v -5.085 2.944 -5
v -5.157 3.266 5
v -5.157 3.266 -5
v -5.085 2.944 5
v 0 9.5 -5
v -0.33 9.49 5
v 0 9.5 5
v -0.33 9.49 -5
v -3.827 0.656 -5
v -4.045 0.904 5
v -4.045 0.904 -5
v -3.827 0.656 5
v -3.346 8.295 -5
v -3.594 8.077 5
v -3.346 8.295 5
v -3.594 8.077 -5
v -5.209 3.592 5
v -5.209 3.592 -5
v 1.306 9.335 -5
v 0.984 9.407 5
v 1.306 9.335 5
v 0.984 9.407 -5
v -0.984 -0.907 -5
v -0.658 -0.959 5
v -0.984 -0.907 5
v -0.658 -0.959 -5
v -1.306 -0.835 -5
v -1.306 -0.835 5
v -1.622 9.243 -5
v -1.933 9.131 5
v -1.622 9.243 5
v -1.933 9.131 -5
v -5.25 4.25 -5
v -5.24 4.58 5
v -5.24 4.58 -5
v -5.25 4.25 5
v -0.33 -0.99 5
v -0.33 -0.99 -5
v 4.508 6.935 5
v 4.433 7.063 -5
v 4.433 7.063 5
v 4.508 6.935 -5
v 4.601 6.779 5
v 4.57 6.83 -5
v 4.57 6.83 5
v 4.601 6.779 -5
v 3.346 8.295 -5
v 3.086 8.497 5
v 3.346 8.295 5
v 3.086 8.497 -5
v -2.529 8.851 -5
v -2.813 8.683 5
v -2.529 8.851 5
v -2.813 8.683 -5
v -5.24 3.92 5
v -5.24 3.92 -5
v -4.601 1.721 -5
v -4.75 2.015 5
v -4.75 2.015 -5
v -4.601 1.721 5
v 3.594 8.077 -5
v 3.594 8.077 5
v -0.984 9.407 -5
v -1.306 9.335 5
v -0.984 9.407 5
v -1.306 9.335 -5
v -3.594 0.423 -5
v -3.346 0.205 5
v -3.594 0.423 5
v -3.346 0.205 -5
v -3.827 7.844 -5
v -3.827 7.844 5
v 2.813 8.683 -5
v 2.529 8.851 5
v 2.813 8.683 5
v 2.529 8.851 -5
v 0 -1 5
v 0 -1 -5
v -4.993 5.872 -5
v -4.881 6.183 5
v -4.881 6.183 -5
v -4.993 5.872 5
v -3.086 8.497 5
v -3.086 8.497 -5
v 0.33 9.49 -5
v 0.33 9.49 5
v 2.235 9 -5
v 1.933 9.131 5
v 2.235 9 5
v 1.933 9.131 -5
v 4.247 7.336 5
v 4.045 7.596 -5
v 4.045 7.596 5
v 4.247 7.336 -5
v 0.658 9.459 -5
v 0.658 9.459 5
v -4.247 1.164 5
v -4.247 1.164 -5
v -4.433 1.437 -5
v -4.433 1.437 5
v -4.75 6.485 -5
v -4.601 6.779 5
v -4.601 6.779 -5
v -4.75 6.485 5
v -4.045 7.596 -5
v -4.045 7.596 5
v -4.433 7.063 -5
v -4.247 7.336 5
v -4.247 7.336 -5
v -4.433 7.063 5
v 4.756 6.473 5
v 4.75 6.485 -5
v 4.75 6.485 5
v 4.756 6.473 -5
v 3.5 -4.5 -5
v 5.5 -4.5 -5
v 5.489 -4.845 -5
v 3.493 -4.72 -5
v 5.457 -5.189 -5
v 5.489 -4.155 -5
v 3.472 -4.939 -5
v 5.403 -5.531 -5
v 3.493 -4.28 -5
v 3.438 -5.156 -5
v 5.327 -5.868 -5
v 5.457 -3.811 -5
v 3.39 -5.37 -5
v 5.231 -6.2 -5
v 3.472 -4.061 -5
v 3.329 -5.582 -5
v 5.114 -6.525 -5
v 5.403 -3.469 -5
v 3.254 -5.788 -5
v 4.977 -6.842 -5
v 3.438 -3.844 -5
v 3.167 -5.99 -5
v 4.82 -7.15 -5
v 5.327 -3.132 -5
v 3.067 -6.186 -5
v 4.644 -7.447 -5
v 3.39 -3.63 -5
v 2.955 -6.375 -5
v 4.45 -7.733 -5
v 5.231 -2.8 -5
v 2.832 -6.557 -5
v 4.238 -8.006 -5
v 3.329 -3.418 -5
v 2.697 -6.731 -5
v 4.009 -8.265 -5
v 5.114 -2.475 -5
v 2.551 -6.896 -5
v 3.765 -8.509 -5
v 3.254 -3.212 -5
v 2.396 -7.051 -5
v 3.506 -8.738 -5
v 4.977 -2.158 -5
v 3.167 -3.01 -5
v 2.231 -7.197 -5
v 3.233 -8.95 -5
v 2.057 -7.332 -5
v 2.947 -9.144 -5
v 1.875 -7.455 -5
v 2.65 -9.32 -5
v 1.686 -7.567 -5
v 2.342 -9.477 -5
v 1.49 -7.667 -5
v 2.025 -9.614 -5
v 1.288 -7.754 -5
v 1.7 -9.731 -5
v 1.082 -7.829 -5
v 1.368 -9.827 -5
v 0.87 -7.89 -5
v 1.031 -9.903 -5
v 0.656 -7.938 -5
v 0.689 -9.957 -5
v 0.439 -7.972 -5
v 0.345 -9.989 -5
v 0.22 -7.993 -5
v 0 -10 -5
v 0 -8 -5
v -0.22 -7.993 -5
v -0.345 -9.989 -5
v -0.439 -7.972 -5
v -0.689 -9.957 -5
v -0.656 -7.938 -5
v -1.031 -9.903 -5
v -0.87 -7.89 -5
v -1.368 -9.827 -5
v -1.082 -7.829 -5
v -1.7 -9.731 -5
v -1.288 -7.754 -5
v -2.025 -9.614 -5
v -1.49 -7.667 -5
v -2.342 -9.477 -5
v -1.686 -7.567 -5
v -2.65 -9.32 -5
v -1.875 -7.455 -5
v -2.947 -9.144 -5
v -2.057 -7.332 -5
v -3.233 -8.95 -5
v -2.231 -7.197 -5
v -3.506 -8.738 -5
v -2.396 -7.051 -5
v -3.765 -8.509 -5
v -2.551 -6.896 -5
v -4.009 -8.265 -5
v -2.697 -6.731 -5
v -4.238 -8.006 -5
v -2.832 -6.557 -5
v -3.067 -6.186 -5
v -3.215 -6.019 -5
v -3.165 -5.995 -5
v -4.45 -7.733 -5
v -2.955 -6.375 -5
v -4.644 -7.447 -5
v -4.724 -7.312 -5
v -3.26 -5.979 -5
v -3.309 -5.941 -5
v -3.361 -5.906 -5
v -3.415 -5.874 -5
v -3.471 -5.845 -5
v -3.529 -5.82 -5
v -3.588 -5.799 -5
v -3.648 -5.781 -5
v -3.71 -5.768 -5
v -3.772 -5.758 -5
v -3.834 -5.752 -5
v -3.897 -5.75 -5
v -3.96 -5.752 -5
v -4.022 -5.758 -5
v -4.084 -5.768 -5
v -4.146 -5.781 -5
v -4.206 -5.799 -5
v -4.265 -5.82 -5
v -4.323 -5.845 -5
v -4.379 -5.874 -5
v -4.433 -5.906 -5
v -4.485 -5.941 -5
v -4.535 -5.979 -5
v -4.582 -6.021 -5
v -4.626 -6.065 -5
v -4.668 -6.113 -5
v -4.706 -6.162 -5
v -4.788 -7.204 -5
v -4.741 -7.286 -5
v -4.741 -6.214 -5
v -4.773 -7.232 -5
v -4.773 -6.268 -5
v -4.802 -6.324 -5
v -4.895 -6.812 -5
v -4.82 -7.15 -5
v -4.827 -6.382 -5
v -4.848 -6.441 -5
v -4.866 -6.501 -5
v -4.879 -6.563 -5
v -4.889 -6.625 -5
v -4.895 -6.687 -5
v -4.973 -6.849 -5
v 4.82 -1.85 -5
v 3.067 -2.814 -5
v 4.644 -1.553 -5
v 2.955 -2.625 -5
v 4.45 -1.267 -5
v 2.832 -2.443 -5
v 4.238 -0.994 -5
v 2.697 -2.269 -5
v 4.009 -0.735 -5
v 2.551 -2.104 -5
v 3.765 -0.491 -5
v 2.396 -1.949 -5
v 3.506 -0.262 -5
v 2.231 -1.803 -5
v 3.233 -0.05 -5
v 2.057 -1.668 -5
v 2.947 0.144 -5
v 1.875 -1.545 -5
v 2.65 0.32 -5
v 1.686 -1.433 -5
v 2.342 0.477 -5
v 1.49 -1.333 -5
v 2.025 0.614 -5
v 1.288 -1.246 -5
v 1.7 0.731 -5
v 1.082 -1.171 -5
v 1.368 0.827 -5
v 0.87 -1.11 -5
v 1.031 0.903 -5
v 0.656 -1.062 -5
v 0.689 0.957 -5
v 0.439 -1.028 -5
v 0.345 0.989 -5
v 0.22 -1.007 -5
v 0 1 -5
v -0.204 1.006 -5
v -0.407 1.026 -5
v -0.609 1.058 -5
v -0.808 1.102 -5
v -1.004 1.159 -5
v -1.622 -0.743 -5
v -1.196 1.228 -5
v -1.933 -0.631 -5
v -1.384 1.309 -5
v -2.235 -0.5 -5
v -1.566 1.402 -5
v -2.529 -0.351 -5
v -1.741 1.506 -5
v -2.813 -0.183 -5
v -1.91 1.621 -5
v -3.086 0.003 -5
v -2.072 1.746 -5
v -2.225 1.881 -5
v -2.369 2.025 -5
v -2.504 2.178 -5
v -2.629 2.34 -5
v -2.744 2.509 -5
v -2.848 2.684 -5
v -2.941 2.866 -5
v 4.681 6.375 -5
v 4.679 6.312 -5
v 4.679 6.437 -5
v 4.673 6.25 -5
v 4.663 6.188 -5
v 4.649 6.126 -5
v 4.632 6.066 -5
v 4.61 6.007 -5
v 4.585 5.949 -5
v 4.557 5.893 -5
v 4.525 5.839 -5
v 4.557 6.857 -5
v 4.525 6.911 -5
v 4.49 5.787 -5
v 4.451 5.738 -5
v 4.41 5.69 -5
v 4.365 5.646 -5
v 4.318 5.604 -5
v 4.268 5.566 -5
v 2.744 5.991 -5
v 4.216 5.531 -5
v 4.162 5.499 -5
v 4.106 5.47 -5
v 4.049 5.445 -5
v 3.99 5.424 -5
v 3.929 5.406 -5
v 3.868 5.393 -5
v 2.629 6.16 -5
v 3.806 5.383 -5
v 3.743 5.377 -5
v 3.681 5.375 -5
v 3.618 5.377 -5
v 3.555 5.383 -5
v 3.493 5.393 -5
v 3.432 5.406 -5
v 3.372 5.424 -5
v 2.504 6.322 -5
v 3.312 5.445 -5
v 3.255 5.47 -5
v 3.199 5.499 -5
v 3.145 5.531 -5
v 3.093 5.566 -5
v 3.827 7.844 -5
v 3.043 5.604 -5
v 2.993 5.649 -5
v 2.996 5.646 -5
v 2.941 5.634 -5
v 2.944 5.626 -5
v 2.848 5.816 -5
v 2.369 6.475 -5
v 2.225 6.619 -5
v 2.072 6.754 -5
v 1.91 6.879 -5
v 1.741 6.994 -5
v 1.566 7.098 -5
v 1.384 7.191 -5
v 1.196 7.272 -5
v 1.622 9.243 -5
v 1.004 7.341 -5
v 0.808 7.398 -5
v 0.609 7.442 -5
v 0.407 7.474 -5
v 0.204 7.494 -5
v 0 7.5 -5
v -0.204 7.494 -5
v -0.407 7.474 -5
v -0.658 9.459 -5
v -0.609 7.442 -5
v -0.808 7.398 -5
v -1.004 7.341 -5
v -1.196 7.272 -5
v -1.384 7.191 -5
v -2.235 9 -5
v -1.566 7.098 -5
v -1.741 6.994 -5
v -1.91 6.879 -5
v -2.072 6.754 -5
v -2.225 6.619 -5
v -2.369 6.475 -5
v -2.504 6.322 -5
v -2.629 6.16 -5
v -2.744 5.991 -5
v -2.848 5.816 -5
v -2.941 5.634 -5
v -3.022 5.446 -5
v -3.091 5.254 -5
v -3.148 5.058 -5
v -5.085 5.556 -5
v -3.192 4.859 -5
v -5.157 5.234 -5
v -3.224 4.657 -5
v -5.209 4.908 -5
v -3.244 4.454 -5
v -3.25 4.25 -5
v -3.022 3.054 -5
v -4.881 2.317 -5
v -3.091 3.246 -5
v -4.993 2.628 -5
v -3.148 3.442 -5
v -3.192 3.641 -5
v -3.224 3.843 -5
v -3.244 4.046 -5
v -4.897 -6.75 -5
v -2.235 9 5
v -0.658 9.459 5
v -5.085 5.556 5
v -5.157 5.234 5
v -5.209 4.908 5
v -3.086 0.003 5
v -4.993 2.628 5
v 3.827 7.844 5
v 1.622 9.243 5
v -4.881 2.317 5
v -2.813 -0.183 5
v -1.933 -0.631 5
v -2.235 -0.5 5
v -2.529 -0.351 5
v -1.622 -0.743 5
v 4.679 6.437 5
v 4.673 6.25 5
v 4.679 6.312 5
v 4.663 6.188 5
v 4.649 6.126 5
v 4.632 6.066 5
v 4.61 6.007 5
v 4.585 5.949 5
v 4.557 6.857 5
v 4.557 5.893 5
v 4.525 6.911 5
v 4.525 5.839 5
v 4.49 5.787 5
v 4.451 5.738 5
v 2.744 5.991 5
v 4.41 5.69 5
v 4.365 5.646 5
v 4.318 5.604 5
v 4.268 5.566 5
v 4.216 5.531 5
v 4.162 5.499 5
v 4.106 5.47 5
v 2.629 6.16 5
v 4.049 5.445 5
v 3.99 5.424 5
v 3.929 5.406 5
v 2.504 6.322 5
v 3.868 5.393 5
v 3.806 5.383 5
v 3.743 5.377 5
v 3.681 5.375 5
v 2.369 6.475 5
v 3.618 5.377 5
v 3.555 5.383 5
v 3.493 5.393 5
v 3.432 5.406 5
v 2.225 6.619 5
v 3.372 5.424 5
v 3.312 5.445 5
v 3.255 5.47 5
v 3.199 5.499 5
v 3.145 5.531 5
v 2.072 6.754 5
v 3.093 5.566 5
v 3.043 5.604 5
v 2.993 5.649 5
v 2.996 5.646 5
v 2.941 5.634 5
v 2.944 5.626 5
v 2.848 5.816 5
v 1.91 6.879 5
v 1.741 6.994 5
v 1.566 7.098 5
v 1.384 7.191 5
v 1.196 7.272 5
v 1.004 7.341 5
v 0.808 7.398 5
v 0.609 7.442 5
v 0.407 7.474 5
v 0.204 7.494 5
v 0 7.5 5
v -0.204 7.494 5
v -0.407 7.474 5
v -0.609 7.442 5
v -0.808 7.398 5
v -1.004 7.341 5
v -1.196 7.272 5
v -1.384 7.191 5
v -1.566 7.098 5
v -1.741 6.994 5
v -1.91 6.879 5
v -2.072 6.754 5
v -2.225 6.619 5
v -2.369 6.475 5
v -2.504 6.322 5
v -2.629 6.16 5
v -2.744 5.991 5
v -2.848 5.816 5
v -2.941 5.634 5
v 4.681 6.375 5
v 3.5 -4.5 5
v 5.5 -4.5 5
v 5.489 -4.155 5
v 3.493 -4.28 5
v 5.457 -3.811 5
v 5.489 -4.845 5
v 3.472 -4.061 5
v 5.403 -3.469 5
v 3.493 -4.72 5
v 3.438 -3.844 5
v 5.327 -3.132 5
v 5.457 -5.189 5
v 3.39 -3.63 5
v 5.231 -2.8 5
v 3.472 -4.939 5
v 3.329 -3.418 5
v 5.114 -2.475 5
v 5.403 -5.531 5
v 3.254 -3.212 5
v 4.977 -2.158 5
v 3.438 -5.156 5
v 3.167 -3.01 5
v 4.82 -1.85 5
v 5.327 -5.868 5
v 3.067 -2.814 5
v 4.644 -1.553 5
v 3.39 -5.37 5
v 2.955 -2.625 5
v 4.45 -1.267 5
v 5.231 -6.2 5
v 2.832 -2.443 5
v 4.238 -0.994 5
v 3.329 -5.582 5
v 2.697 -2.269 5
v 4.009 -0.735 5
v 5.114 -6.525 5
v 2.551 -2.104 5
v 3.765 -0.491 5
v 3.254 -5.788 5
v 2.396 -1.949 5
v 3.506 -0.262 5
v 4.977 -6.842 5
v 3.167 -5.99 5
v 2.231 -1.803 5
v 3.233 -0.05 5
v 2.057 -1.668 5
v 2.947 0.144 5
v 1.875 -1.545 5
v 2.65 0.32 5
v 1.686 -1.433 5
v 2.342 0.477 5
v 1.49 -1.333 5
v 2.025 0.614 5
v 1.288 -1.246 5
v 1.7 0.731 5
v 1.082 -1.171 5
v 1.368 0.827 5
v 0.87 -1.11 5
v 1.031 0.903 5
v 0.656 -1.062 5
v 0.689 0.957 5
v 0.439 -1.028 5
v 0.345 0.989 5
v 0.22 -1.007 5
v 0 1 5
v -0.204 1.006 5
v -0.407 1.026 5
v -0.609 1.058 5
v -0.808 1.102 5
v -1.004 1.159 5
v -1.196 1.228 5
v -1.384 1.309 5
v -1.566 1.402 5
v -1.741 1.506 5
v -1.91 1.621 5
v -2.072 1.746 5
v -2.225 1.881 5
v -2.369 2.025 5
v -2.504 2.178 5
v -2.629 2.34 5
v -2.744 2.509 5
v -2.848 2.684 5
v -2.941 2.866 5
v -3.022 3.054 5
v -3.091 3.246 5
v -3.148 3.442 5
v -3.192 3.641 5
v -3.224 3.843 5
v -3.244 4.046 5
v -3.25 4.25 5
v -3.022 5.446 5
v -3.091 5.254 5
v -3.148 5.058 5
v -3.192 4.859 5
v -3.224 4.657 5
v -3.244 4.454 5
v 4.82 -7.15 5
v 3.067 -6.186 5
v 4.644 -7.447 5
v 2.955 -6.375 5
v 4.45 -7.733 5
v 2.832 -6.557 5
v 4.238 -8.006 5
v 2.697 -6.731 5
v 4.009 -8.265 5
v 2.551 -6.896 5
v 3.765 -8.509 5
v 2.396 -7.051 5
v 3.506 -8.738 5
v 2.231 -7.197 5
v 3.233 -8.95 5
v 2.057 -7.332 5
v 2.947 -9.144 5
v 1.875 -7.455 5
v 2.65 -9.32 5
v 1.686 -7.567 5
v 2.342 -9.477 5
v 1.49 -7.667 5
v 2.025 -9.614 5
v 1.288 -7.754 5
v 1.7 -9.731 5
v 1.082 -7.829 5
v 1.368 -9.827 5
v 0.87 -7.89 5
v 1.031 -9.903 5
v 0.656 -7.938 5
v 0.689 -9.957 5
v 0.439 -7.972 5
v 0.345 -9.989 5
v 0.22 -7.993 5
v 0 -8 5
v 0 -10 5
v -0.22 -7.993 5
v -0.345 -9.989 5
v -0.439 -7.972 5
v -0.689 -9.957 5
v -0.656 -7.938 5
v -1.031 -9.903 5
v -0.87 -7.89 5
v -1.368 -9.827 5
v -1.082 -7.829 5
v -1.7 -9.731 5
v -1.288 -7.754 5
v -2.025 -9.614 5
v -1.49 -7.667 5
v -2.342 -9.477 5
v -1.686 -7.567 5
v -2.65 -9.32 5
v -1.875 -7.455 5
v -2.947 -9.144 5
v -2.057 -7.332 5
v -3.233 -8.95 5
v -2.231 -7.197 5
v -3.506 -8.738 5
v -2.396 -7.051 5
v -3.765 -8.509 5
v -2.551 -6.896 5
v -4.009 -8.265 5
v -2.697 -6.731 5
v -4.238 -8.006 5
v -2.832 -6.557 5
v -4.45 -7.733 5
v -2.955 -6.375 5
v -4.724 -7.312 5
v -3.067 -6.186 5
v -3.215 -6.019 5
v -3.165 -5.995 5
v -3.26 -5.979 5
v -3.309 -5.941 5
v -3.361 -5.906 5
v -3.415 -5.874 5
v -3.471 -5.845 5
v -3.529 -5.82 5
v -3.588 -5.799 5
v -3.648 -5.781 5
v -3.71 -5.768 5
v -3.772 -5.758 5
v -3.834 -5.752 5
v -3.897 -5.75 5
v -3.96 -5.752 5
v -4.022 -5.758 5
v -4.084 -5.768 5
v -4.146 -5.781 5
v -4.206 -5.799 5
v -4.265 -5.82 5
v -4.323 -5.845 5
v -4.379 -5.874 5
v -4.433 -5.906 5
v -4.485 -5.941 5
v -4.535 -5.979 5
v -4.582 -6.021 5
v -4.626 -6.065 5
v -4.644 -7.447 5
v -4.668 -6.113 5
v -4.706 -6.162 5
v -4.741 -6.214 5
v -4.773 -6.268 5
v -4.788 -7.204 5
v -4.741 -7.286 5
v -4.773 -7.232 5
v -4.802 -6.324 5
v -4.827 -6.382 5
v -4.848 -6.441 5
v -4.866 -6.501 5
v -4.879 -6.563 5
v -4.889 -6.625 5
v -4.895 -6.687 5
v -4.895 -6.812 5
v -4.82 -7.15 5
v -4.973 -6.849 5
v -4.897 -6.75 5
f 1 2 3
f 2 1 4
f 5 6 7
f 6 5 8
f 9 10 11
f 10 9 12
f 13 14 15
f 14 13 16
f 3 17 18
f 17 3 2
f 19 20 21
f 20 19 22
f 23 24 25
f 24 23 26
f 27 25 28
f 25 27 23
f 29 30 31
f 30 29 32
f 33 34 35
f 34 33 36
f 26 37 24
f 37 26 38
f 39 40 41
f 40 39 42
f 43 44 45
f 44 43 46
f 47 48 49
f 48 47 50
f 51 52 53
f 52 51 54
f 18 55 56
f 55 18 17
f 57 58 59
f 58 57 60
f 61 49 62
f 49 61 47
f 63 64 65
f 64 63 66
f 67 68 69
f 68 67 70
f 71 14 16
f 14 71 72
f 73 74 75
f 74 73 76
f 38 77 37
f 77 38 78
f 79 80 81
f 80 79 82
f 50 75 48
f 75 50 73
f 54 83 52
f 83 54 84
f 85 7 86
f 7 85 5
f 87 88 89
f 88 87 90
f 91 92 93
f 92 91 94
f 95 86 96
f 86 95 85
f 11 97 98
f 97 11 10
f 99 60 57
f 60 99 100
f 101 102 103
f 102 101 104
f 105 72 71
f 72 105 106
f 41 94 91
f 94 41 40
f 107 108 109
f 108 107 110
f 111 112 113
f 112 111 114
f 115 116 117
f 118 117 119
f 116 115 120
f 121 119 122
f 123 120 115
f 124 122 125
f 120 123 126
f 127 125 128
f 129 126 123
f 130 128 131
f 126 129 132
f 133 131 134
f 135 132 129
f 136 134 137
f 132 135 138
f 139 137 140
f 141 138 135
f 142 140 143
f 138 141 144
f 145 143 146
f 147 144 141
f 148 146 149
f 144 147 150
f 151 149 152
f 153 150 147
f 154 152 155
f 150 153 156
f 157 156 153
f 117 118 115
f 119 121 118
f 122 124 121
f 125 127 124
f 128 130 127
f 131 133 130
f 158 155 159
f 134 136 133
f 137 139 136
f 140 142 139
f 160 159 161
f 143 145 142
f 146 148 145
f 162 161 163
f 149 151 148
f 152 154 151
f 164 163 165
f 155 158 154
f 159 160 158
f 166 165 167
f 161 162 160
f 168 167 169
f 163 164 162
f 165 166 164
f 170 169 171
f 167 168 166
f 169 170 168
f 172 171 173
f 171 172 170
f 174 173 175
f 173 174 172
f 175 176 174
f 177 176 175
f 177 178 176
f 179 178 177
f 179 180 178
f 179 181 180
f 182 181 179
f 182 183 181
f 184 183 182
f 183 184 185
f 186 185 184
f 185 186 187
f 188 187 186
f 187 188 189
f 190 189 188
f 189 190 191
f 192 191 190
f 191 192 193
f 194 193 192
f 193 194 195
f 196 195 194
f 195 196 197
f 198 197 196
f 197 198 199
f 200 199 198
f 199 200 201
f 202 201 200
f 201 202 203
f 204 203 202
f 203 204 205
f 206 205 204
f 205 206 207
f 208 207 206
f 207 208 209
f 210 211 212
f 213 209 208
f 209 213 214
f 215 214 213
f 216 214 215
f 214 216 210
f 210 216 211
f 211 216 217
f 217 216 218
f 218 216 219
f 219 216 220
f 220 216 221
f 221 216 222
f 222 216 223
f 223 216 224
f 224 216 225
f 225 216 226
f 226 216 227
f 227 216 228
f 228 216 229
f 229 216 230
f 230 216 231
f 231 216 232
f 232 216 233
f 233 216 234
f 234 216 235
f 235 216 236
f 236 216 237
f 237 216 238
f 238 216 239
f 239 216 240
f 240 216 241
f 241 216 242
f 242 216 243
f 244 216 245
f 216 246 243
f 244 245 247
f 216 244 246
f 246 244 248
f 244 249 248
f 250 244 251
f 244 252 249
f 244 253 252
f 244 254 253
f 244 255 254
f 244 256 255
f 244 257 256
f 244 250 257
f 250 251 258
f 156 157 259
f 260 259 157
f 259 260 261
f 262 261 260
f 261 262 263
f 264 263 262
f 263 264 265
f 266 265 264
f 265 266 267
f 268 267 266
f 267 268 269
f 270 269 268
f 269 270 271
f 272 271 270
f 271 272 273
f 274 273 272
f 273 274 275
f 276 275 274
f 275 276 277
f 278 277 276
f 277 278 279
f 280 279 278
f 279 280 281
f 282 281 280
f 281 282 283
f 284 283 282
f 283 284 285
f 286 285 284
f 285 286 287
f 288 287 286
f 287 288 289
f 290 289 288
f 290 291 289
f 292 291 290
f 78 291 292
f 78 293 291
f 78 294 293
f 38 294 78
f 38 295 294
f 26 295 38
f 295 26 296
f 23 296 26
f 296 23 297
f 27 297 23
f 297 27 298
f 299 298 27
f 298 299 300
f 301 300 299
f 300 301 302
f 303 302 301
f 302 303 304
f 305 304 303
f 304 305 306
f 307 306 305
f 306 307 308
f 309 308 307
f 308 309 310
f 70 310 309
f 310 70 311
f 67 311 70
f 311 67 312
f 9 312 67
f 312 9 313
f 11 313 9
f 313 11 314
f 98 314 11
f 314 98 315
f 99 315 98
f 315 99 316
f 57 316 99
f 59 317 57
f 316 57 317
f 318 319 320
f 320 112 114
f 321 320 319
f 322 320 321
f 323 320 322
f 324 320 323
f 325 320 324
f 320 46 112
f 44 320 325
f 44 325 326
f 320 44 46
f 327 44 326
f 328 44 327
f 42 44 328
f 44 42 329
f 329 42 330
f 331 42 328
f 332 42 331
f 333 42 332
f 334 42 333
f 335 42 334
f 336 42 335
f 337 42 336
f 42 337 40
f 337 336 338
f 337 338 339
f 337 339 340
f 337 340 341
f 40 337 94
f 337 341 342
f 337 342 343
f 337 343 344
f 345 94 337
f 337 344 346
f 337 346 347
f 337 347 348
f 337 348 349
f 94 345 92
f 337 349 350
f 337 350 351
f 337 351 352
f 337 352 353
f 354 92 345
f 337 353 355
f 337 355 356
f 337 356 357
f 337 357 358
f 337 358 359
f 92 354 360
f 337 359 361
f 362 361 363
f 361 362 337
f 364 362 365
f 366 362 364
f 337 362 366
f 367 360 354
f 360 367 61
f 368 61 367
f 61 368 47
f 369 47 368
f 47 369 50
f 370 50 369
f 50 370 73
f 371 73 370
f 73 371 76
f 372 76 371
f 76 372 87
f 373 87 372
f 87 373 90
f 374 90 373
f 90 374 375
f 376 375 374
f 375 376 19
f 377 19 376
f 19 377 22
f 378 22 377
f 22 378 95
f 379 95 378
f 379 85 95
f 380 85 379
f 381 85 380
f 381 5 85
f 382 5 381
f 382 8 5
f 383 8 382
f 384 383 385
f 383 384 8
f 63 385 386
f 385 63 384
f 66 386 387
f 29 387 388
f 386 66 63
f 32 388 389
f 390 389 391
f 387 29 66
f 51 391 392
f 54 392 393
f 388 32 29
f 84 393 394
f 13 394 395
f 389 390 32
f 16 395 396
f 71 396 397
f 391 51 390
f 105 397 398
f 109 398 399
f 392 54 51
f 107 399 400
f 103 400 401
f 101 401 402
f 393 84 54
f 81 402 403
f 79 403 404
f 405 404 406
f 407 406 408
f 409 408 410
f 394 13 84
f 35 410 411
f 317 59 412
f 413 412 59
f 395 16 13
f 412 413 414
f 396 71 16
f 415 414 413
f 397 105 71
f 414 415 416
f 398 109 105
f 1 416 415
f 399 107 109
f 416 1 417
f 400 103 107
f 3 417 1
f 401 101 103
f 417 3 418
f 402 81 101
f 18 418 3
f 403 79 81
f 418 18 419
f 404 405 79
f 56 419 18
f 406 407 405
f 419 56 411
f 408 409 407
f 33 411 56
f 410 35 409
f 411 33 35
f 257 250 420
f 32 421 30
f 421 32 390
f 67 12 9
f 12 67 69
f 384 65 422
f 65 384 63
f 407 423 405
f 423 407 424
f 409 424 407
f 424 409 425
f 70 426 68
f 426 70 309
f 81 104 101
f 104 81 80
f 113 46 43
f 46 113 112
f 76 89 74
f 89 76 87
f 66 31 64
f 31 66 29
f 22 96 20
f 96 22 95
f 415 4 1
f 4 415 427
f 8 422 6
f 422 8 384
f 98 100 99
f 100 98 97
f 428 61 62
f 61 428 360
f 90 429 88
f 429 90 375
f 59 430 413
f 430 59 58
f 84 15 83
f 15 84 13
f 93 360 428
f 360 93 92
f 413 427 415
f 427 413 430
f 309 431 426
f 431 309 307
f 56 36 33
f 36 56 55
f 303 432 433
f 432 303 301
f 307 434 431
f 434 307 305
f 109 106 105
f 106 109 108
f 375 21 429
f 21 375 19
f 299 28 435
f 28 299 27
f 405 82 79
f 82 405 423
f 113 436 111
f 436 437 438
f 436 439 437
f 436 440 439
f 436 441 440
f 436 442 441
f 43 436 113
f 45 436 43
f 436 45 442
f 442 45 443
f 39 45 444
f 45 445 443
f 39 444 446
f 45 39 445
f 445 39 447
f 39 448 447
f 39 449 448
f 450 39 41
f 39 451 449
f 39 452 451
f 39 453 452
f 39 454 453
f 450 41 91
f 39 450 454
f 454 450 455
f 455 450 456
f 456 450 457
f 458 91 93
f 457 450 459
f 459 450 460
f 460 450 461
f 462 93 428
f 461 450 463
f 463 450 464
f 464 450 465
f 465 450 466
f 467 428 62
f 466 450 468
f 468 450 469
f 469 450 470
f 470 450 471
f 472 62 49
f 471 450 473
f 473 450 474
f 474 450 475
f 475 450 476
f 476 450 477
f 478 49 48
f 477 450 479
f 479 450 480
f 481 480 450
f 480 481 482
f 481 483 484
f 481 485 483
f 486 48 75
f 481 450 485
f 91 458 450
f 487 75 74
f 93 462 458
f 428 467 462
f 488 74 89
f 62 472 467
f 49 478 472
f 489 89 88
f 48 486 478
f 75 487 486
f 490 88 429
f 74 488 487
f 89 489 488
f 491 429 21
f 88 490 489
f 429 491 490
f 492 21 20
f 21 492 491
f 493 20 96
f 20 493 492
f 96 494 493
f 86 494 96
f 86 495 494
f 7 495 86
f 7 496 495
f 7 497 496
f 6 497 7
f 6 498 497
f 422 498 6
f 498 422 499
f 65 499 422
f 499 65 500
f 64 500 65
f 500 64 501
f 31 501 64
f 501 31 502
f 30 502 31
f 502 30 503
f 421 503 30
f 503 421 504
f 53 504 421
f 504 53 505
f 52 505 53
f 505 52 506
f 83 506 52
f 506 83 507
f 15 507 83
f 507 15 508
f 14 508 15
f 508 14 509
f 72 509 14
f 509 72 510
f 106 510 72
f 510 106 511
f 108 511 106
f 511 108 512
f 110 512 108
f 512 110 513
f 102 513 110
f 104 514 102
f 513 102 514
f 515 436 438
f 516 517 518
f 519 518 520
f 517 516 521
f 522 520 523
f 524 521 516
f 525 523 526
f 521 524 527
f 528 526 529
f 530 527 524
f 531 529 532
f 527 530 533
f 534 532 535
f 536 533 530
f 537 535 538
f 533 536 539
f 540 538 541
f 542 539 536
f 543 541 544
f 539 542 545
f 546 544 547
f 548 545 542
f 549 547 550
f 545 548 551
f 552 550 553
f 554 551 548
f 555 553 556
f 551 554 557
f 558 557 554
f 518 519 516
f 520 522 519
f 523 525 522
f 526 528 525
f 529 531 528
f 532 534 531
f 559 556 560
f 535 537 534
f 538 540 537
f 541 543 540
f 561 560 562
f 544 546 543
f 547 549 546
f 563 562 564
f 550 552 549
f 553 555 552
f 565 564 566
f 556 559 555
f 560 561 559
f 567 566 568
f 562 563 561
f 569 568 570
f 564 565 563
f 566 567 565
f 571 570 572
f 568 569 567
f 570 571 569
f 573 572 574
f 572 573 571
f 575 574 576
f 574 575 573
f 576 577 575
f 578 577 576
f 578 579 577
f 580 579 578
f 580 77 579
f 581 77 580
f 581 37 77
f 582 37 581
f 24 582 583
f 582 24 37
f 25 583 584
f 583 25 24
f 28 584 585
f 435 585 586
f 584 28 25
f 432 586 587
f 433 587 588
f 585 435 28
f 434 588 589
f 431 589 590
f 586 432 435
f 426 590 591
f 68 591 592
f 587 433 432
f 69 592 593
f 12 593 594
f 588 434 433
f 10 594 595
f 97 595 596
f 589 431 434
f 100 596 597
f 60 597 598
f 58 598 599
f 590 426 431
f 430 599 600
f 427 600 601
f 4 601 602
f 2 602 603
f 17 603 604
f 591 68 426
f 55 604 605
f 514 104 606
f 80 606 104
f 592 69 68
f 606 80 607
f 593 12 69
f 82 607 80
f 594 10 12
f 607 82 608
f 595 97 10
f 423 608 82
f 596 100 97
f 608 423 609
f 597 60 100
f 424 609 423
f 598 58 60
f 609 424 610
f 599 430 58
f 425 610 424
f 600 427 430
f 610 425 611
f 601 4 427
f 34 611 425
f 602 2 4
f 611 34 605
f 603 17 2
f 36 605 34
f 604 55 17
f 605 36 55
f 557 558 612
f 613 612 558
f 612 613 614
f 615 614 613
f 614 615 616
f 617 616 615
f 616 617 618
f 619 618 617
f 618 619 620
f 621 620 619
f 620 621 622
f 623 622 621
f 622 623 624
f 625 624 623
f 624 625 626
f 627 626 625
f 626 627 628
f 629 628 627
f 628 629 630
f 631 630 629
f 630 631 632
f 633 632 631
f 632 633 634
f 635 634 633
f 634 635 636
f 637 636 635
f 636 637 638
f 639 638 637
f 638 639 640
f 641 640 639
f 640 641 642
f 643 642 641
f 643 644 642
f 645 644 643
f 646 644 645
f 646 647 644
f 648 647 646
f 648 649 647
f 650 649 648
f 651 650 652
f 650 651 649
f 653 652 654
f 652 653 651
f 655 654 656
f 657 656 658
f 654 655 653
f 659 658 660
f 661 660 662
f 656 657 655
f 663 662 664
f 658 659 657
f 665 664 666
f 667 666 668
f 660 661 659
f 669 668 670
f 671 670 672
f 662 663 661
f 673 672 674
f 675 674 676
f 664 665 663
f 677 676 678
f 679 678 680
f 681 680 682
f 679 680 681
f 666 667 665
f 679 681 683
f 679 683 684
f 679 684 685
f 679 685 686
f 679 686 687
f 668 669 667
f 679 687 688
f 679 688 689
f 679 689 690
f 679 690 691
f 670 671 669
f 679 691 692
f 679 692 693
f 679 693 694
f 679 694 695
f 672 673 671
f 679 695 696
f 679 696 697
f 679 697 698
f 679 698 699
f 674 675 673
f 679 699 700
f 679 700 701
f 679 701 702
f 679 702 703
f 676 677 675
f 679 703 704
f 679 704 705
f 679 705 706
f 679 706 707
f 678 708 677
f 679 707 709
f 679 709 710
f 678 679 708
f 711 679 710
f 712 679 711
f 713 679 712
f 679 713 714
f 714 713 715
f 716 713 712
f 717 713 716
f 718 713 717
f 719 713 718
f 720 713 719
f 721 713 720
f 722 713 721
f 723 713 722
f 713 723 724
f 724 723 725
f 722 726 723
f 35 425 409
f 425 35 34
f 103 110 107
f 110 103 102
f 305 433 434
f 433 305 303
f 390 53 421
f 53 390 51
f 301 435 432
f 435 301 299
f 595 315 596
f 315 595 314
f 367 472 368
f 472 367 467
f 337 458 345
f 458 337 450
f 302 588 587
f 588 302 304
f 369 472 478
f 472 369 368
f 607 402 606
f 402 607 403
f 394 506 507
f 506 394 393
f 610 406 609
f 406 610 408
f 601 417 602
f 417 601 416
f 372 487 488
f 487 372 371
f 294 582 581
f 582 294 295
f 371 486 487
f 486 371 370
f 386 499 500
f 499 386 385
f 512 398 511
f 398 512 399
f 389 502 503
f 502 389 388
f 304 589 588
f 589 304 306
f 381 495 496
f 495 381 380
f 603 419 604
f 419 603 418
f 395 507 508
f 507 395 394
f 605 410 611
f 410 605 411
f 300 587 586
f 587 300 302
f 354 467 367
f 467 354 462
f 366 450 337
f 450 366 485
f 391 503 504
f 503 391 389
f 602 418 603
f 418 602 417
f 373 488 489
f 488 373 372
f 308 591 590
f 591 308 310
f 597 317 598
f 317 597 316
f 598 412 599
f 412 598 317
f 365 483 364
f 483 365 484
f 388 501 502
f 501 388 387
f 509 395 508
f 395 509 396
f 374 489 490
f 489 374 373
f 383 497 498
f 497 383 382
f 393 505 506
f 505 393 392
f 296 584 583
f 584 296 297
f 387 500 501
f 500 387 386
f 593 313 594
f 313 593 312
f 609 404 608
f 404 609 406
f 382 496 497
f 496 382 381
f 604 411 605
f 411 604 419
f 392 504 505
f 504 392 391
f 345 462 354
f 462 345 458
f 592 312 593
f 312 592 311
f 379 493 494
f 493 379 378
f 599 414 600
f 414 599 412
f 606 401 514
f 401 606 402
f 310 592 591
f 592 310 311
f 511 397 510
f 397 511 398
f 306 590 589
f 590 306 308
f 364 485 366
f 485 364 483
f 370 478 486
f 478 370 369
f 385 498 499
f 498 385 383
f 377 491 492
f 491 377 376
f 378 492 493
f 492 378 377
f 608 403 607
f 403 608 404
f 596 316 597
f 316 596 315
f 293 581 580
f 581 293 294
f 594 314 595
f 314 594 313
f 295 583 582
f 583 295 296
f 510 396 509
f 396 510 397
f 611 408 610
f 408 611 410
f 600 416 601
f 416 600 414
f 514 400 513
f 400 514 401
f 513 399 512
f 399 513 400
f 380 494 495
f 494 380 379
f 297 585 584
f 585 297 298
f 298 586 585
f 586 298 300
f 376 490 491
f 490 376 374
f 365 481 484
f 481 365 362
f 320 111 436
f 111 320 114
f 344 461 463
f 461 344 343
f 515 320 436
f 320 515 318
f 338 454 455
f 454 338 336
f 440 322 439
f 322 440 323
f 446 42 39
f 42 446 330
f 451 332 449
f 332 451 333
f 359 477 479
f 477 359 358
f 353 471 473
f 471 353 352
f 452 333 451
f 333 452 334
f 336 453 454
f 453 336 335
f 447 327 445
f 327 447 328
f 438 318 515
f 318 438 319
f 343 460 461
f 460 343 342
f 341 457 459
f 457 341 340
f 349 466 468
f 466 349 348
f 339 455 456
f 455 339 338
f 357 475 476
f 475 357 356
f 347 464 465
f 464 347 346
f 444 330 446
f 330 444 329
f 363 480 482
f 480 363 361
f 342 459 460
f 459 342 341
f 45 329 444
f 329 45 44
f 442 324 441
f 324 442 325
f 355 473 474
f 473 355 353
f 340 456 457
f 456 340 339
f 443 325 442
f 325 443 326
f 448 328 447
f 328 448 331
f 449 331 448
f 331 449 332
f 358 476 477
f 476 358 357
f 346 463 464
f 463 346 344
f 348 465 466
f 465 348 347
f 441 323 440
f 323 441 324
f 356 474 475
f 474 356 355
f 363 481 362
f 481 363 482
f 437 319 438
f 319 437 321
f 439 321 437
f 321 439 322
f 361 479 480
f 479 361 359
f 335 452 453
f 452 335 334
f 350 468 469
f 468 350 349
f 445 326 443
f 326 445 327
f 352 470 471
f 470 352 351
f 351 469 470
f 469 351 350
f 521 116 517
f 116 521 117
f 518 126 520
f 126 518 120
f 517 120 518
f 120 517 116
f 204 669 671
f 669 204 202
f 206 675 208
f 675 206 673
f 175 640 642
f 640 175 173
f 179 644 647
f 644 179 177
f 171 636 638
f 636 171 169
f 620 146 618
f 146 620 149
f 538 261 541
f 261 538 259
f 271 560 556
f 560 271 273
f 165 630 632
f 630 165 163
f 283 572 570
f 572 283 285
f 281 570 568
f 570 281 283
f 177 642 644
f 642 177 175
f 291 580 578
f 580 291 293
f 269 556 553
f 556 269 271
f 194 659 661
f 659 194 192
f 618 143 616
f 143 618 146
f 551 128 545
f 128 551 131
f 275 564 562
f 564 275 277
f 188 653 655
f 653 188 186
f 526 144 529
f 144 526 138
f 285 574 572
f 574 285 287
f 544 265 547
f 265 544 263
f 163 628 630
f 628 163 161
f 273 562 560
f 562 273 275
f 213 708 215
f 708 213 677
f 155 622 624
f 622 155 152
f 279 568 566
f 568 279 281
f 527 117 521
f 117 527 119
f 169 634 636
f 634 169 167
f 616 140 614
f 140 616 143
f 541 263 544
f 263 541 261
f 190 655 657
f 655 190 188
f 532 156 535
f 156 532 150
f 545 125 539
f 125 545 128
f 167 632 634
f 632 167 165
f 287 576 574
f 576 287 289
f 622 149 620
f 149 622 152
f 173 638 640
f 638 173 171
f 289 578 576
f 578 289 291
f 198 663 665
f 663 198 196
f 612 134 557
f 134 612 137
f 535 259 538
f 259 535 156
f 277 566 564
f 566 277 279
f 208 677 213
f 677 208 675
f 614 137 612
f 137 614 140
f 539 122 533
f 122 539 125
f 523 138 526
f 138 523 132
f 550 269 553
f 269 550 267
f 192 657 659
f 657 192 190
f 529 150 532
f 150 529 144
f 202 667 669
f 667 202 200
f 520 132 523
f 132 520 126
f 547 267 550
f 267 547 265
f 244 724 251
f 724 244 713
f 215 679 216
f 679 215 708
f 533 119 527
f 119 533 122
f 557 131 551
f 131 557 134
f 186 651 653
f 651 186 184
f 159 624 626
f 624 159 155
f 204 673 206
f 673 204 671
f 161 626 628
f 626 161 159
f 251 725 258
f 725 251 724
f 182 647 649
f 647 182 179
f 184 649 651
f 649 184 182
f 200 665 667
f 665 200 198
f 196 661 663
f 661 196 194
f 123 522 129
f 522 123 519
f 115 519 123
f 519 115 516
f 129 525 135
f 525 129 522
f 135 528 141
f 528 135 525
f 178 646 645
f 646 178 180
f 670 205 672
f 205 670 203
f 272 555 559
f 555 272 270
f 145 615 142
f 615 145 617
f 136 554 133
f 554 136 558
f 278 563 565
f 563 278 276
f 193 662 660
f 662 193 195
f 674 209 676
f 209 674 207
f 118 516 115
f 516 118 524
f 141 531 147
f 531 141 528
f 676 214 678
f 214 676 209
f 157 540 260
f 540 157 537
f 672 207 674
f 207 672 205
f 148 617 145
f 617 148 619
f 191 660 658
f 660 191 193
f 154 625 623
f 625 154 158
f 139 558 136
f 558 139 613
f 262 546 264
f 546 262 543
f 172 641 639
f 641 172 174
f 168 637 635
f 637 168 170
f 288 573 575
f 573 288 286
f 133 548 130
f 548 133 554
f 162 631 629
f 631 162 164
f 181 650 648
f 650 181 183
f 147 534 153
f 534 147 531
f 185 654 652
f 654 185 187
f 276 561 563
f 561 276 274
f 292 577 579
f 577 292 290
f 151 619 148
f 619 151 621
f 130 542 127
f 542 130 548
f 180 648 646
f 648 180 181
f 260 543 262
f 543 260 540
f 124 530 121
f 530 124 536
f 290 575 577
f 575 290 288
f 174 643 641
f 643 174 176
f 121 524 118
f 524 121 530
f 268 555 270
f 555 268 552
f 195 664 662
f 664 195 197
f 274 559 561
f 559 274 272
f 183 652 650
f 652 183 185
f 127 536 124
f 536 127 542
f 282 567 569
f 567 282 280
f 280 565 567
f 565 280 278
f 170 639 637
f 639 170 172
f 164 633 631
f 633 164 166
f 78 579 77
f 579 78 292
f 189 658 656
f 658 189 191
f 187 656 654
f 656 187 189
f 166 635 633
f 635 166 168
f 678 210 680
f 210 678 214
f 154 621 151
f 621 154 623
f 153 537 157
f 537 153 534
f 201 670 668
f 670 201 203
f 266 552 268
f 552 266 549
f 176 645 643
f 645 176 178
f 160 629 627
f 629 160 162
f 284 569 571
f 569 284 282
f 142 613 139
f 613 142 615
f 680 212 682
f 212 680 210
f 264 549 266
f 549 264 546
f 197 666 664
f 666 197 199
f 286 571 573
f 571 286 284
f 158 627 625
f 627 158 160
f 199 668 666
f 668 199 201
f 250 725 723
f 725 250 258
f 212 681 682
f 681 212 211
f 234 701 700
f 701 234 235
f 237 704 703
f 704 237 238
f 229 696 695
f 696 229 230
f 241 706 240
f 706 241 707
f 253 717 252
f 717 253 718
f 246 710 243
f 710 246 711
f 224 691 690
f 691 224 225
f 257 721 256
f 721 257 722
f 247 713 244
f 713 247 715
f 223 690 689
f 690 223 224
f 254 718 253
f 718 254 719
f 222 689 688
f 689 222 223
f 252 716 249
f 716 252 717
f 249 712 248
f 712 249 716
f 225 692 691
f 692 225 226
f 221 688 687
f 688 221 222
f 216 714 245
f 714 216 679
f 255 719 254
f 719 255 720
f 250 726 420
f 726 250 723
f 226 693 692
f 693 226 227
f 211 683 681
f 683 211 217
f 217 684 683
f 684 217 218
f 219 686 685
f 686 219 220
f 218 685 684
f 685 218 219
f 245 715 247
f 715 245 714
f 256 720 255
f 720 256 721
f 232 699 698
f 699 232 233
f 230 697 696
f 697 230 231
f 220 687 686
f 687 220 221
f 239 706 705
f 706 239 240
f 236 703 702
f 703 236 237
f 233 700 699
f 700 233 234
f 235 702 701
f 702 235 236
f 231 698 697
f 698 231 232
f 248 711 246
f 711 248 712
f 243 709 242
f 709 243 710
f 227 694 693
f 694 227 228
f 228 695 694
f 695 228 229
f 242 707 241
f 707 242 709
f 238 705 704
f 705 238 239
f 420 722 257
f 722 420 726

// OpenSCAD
// Wall thickness
thickness = 2.0; // 1.0-3.0

// Length of the clips
w = 10.0; // 5.0-20.0

// Diameter of first cable
dia1 = 6.5; // 3.0-10.0

// Diameter of second cable
dia2 = 7.0; // 3.0-10.0

/* [Hidden] */
// Roundness
fn = 100;
// Size of opening to push cables in
angle = 60;

// --- code starts here ---
union() {
	// first diameter
	translate([0, (dia1+thickness)/2, 0]) union() {
        difference() {
            cylinder(h=w, $fn=fn, d=dia1+2*thickness, center=true);
            cylinder(h=w+1, $fn=fn, d=dia1, center=true);
            linear_extrude(height=w+1, center=true) polygon(points=[[0, 0], [0, -2*(dia1+2*thickness)], [sin(angle)*2*(dia1+2*thickness), cos(angle)*2*(dia1+thickness)]]);
        }
        translate([sin(angle)*(dia1+thickness)/2, cos(angle)*(dia1+thickness)/2]) cylinder(h=w, $fn=fn, d=thickness, center=true);
    }
	// second diameter
	translate([0, -(dia2+thickness)/2, 0]) union() {
        difference() {
            cylinder(h=w, $fn=fn, d=dia2+2*thickness, center=true);
            cylinder(h=w+1, $fn=fn, d=dia2, center=true);
            linear_extrude(height=w+1, center=true) polygon(points=[[0, 0], [0, 2*(dia2+2*thickness)], [sin(angle+180)*2*(dia2+2*thickness), cos(angle+180)*2*(dia2+thickness)]]);
        }
        translate([sin(angle+180)*(dia2+thickness)/2, cos(angle+180)*(dia2+thickness)/2]) cylinder(h=w, $fn=fn, d=thickness, center=true);
    }
    // add overlap between the two halfs (makes object manifold)
    cylinder(h=w, $fn=fn, d=thickness, center=true);
}
